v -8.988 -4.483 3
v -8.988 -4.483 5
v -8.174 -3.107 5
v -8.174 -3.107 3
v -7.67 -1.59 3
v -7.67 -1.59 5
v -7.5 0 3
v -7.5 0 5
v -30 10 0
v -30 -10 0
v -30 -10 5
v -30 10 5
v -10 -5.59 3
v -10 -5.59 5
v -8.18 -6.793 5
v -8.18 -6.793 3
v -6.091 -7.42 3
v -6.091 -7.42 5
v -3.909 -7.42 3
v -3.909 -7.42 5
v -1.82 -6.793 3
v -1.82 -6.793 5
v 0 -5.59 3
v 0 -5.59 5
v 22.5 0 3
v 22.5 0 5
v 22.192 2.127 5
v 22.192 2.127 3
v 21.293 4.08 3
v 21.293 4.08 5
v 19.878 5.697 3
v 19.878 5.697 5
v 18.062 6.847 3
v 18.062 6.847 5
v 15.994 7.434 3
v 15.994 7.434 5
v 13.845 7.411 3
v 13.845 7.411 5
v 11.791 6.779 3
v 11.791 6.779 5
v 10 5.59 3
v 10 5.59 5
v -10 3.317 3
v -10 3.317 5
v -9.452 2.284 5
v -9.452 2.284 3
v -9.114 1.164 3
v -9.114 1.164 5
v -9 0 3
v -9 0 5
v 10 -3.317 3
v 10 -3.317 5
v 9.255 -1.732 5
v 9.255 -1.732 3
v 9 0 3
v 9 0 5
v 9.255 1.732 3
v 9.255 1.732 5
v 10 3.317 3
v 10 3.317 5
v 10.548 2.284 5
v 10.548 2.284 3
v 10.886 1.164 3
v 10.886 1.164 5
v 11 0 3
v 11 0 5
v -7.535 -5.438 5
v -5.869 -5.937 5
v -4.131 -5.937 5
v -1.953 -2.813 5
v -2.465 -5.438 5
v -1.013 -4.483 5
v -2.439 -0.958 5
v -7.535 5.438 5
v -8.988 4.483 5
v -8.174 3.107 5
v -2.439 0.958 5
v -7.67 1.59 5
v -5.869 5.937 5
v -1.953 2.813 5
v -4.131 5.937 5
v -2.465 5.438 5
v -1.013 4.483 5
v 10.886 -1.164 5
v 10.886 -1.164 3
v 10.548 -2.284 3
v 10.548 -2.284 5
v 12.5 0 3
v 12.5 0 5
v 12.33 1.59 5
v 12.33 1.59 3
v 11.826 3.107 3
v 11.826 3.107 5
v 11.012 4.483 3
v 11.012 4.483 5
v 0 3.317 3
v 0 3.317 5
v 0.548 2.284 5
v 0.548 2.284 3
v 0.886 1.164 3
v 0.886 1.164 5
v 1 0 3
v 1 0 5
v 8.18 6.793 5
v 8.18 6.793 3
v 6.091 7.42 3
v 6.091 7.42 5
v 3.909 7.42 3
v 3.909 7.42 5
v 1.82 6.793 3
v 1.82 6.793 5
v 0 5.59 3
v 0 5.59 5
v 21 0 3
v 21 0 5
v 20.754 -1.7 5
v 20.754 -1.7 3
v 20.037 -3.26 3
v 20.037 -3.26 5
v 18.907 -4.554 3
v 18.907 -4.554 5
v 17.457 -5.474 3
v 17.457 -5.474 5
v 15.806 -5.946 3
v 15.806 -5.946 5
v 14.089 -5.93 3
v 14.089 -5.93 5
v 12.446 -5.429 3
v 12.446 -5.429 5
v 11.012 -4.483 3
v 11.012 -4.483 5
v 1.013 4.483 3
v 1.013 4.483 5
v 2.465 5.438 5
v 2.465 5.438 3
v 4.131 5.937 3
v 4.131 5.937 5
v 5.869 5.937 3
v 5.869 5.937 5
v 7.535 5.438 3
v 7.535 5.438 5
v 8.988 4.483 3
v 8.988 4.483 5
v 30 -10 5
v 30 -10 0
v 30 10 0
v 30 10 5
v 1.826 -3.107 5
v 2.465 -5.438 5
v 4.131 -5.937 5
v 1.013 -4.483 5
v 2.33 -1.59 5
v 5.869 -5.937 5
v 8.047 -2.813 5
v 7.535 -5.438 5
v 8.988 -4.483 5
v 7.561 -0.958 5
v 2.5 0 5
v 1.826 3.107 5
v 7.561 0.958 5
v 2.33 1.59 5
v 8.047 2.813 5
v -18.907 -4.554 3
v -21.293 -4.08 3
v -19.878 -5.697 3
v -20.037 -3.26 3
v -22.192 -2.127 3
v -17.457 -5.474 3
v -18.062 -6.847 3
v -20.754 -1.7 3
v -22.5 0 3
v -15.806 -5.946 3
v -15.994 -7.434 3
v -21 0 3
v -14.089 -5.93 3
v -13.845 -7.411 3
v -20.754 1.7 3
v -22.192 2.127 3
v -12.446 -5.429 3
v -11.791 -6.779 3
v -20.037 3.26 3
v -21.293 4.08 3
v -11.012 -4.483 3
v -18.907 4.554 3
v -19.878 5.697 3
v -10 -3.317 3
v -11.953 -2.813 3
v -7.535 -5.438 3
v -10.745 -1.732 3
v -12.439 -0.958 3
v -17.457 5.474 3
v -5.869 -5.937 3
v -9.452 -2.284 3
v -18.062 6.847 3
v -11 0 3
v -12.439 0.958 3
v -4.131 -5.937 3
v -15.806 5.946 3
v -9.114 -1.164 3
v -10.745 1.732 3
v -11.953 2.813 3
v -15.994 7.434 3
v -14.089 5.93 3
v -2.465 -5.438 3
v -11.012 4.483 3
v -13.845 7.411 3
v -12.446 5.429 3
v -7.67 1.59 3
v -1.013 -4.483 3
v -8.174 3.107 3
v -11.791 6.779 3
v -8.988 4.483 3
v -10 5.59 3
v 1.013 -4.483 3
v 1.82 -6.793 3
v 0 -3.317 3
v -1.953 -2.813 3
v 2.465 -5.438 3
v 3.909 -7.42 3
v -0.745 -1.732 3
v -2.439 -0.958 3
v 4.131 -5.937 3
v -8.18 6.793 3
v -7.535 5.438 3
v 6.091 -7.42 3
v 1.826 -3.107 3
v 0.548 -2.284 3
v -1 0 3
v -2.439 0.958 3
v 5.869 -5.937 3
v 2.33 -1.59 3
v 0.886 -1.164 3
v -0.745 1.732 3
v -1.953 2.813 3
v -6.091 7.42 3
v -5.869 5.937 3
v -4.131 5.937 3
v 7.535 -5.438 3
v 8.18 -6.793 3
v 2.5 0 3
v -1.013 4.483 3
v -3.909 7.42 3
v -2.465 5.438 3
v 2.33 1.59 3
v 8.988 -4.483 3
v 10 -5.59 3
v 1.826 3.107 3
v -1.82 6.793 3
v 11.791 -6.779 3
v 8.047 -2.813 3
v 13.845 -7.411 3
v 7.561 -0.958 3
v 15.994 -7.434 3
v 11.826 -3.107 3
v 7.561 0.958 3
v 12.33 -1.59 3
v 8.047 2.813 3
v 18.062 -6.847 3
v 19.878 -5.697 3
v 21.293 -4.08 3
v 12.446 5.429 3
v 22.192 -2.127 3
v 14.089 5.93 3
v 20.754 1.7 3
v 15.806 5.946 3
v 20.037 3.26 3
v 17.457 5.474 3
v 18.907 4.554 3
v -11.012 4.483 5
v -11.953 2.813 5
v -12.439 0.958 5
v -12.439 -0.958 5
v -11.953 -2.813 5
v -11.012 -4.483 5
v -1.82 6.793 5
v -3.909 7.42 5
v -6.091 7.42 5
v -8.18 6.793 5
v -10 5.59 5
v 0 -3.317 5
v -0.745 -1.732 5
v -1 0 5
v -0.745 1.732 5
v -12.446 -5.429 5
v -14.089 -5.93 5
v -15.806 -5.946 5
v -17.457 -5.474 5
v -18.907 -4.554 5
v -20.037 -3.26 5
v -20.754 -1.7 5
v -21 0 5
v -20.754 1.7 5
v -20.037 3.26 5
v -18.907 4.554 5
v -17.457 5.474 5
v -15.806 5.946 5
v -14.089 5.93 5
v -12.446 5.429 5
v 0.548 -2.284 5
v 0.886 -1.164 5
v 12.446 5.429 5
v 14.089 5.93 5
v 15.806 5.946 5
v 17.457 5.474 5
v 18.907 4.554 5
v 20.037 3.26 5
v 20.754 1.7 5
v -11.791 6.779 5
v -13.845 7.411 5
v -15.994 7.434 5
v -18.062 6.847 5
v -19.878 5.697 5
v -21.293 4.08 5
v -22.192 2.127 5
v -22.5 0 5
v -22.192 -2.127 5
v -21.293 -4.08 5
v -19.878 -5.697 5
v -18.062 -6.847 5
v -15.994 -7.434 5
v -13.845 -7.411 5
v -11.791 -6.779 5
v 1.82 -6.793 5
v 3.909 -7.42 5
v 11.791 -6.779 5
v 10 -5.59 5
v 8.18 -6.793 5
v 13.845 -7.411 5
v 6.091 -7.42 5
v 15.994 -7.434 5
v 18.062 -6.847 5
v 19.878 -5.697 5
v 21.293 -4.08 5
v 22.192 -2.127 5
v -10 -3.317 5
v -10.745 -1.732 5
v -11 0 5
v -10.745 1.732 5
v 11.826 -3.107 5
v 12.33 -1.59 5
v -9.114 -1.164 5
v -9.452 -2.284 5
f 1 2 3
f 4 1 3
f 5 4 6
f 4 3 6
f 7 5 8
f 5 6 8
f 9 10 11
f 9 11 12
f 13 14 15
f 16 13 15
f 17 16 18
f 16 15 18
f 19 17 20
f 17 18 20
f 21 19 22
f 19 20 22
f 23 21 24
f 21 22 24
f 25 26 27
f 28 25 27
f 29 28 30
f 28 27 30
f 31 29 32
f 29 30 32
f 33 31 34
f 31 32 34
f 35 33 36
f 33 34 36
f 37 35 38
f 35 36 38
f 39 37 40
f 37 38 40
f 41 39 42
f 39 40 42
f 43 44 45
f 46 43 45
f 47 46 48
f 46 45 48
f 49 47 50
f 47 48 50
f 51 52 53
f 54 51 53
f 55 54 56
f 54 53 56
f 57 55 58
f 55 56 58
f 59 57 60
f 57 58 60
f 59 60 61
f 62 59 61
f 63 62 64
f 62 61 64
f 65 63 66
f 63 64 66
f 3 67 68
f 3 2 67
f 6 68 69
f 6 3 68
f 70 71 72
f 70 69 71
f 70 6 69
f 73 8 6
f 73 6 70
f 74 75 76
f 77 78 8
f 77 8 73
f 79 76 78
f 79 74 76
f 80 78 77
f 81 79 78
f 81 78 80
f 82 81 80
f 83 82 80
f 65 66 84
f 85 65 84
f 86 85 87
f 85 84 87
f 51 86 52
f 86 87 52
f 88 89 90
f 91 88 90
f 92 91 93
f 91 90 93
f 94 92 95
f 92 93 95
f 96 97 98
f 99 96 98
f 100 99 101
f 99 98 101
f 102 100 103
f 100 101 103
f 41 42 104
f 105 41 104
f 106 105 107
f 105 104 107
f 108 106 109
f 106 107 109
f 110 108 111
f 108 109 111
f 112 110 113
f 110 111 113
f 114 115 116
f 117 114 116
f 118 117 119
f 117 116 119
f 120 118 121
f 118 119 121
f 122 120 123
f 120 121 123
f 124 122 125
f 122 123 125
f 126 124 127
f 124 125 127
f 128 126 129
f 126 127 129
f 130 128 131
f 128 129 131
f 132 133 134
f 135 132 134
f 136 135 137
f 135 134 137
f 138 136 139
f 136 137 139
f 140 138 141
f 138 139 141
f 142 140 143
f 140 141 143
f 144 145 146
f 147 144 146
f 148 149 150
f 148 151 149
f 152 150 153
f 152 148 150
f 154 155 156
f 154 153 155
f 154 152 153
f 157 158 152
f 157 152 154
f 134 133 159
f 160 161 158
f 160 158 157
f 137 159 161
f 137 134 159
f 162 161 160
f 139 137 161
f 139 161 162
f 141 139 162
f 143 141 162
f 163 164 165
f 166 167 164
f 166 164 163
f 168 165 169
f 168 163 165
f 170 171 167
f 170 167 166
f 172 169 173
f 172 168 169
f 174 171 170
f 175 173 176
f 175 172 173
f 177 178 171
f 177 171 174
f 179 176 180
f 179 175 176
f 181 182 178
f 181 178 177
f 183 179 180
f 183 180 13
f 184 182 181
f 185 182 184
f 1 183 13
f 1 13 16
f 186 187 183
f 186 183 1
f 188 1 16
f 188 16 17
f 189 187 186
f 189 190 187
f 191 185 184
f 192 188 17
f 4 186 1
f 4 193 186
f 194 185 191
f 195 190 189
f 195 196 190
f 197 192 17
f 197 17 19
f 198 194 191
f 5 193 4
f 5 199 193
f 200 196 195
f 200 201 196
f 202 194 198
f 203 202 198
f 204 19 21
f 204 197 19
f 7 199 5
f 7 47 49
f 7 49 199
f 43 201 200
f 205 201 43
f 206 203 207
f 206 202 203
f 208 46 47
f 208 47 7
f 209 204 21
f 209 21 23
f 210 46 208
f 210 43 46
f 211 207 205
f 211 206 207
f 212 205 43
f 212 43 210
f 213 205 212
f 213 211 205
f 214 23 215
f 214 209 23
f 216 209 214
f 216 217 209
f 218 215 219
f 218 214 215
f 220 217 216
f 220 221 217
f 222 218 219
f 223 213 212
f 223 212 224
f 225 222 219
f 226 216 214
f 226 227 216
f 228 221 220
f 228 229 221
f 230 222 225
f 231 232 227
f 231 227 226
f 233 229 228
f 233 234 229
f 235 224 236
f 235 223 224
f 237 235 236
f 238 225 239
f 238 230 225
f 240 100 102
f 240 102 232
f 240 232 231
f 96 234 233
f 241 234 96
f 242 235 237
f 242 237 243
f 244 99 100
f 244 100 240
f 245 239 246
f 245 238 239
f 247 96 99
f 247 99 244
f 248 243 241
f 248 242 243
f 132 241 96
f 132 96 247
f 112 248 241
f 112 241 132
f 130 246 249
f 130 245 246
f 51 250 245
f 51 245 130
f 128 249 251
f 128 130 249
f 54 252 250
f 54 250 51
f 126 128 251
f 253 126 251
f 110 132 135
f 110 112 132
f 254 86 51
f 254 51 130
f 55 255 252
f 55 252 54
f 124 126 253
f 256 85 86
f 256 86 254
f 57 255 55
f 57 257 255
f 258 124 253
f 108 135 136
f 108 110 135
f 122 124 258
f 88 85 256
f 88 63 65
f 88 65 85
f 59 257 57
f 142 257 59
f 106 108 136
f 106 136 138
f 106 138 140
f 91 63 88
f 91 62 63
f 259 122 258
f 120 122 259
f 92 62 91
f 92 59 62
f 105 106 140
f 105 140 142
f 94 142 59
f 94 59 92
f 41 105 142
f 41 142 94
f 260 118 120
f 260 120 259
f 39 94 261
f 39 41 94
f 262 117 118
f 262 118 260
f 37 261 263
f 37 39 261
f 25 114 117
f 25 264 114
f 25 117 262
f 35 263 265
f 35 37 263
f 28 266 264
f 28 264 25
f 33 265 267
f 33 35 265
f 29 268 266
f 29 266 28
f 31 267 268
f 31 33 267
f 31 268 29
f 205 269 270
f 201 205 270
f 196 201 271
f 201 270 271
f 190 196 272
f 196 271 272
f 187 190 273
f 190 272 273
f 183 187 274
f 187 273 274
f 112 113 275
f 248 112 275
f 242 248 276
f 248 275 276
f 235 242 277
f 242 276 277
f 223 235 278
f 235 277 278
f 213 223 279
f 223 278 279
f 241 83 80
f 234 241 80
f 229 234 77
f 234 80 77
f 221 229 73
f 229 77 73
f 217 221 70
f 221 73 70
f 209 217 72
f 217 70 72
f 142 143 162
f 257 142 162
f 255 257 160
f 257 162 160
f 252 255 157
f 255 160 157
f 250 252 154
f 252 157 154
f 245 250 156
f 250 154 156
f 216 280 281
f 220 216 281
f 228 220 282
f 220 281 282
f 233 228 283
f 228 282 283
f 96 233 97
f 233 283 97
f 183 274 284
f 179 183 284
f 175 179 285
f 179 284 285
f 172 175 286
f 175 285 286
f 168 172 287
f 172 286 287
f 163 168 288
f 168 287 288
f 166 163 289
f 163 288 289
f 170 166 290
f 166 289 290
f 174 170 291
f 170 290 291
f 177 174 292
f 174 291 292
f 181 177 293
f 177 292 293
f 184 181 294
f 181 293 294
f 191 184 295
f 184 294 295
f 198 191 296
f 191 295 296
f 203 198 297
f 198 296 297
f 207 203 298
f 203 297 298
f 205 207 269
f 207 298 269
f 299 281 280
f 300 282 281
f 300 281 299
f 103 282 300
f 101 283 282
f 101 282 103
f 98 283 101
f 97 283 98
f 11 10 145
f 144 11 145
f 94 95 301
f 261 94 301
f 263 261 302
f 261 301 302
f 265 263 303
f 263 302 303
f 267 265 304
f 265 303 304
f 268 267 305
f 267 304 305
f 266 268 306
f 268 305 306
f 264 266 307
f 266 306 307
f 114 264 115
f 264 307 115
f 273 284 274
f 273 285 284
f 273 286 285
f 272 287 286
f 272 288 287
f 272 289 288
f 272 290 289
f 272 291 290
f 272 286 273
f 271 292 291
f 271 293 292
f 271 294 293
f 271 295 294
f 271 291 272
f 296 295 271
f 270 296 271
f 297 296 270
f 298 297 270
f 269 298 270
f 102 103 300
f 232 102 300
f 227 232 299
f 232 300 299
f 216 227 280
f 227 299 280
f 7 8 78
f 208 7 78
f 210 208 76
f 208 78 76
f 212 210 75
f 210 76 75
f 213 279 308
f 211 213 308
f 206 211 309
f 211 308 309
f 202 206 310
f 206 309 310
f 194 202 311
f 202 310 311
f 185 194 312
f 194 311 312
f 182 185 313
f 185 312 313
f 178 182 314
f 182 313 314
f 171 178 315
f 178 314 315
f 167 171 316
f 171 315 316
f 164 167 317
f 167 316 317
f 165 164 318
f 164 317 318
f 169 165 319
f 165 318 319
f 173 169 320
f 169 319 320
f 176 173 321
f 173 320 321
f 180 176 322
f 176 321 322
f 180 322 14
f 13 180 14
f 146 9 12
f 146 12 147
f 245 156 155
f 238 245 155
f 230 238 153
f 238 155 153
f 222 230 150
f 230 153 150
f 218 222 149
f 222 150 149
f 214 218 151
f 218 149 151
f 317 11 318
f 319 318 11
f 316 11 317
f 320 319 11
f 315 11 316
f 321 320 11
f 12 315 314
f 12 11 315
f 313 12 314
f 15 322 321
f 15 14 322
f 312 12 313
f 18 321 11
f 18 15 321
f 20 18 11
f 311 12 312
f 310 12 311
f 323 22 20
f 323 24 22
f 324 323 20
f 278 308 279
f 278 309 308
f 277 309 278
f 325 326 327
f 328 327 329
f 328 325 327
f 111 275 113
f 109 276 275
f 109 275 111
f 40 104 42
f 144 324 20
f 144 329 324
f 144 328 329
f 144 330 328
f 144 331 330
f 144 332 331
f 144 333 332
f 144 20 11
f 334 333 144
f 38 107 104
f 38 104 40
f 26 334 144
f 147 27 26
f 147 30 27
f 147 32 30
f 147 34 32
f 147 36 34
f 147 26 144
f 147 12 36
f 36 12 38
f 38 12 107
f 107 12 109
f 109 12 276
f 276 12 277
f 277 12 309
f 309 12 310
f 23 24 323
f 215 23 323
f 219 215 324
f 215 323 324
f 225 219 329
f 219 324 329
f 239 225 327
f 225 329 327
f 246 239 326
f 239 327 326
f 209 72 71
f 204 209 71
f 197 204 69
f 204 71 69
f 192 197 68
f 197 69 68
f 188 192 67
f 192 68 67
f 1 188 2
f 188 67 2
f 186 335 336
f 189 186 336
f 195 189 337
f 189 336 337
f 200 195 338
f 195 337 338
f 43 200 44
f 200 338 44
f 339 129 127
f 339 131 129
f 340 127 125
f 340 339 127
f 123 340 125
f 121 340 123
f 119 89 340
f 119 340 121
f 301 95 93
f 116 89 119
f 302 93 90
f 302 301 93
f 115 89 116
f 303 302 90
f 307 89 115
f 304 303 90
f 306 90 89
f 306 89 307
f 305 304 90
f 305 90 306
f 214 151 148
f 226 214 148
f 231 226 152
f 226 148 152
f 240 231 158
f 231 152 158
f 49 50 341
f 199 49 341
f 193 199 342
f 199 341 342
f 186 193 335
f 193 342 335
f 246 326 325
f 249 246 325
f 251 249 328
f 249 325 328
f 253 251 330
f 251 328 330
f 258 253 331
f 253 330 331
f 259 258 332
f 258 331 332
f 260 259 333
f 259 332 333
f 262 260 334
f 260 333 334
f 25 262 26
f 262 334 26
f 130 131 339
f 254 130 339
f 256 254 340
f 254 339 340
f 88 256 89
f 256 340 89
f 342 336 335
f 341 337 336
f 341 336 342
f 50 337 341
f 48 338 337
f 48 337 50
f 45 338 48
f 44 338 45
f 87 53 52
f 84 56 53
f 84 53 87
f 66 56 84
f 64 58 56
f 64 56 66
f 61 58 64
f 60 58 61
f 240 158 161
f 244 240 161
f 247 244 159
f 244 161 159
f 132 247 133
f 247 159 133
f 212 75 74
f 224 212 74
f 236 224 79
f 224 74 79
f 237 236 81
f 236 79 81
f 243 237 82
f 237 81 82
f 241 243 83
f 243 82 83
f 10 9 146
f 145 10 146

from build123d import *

# Parameters (mm, degrees)
F0_W     = 60
F0_H     = 20
F1_DEPTH = 5
F3_DEPTH = 2


with BuildPart() as f1:
    # F0 (on Top) → F1 (new body)
    with BuildSketch(Plane.XY):
        Rectangle(F0_W, F0_H)
    extrude(amount=F1_DEPTH)

    # F2 (on face) → F3 (cut)
    with BuildSketch(Plane.XY.offset(5)):
        with BuildLine():
            ThreePointArc((-8.9875, -4.4832849285), (-7.8815819875, -2.3618054535), (-7.5, 0))
            ThreePointArc((-7.5, 0), (-7.8815819875, 2.3618054535), (-8.9875, 4.4832849285))
            ThreePointArc((-8.9875, 4.4832849285), (-9.5314526404, 3.9326755483), (-10, 3.3166247904))
            ThreePointArc((-10, 3.3166247904), (-9.2554373535, 1.7320508076), (-9, 0))
            ThreePointArc((-9, 0), (-9.2554373535, -1.7320508076), (-10, -3.3166247904))
            ThreePointArc((-10, -3.3166247904), (-9.5314526404, -3.9326755483), (-8.9875, -4.4832849285))
        make_face()
        with BuildLine():
            ThreePointArc((-10, 3.3166247904), (-9.5314526404, 3.9326755483), (-8.9875, 4.4832849285))
            ThreePointArc((-8.9875, 4.4832849285), (-9.4660061735, 5.0621055232), (-10, 5.5901699437))
            ThreePointArc((-10, 5.5901699437), (-10.5339938265, 5.0621055232), (-11.0125, 4.4832849285))
            ThreePointArc((-11.0125, 4.4832849285), (-10.4685473596, 3.9326755483), (-10, 3.3166247904))
        make_face()
        with BuildLine():
            ThreePointArc((-10, 5.5901699437), (-9.4660061735, 5.0621055232), (-8.9875, 4.4832849285))
            ThreePointArc((-8.9875, 4.4832849285), (-5, 6), (-1.0125, 4.4832849285))
            ThreePointArc((-1.0125, 4.4832849285), (-0.5339938265, 5.0621055232), (0, 5.5901699437))
            ThreePointArc((0, 5.5901699437), (-5, 7.5), (-10, 5.5901699437))
        make_face()
        with BuildLine():
            ThreePointArc((-1.0125, -4.4832849285), (-5, -6), (-8.9875, -4.4832849285))
            ThreePointArc((-8.9875, -4.4832849285), (-9.4660061735, -5.0621055232), (-10, -5.5901699437))
            ThreePointArc((-10, -5.5901699437), (-5, -7.5), (0, -5.5901699437))
            ThreePointArc((0, -5.5901699437), (-0.5339938265, -5.0621055232), (-1.0125, -4.4832849285))
        make_face()
        with BuildLine():
            ThreePointArc((-10, -5.5901699437), (-9.4660061735, -5.0621055232), (-8.9875, -4.4832849285))
            ThreePointArc((-8.9875, -4.4832849285), (-9.5314526404, -3.9326755483), (-10, -3.3166247904))
            ThreePointArc((-10, -3.3166247904), (-10.4685473596, -3.9326755483), (-11.0125, -4.4832849285))
            ThreePointArc((-11.0125, -4.4832849285), (-10.5339938265, -5.0621055232), (-10, -5.5901699437))
        make_face()
        with BuildLine():
            ThreePointArc((-11.0125, 4.4832849285), (-10.5339938265, 5.0621055232), (-10, 5.5901699437))
            ThreePointArc((-10, 5.5901699437), (-22.5, 0), (-10, -5.5901699437))
            ThreePointArc((-10, -5.5901699437), (-10.5339938265, -5.0621055232), (-11.0125, -4.4832849285))
            ThreePointArc((-11.0125, -4.4832849285), (-21, 0), (-11.0125, 4.4832849285))
        make_face()
        with BuildLine():
            ThreePointArc((0, 5.5901699437), (-0.5339938265, 5.0621055232), (-1.0125, 4.4832849285))
            ThreePointArc((-1.0125, 4.4832849285), (-0.4685473596, 3.9326755483), (0, 3.3166247904))
            ThreePointArc((0, 3.3166247904), (0.4685473596, 3.9326755483), (1.0125, 4.4832849285))
            ThreePointArc((1.0125, 4.4832849285), (0.5339938265, 5.0621055232), (0, 5.5901699437))
        make_face()
        with BuildLine():
            ThreePointArc((0, 3.3166247904), (-0.4685473596, 3.9326755483), (-1.0125, 4.4832849285))
            ThreePointArc((-1.0125, 4.4832849285), (-2.5, 0), (-1.0125, -4.4832849285))
            ThreePointArc((-1.0125, -4.4832849285), (-0.4685473596, -3.9326755483), (0, -3.3166247904))
            ThreePointArc((0, -3.3166247904), (-1, 0), (0, 3.3166247904))
        make_face()
        with BuildLine():
            ThreePointArc((-10, -3.3166247904), (-11, 0), (-10, 3.3166247904))
            ThreePointArc((-10, 3.3166247904), (-10.4685473596, 3.9326755483), (-11.0125, 4.4832849285))
            ThreePointArc((-11.0125, 4.4832849285), (-12.5, 0), (-11.0125, -4.4832849285))
            ThreePointArc((-11.0125, -4.4832849285), (-10.4685473596, -3.9326755483), (-10, -3.3166247904))
        make_face()
        with BuildLine():
            ThreePointArc((0, -3.3166247904), (-0.4685473596, -3.9326755483), (-1.0125, -4.4832849285))
            ThreePointArc((-1.0125, -4.4832849285), (-0.5339938265, -5.0621055232), (0, -5.5901699437))
            ThreePointArc((0, -5.5901699437), (0.5339938265, -5.0621055232), (1.0125, -4.4832849285))
            ThreePointArc((1.0125, -4.4832849285), (0.4685473596, -3.9326755483), (0, -3.3166247904))
        make_face()
        with BuildLine():
            ThreePointArc((10, 5.5901699437), (5, 7.5), (0, 5.5901699437))
            ThreePointArc((0, 5.5901699437), (0.5339938265, 5.0621055232), (1.0125, 4.4832849285))
            ThreePointArc((1.0125, 4.4832849285), (5, 6), (8.9875, 4.4832849285))
            ThreePointArc((8.9875, 4.4832849285), (9.4660061735, 5.0621055232), (10, 5.5901699437))
        make_face()
        with BuildLine():
            ThreePointArc((1.0125, 4.4832849285), (0.4685473596, 3.9326755483), (0, 3.3166247904))
            ThreePointArc((0, 3.3166247904), (0.7445626465, 1.7320508076), (1, 0))
            ThreePointArc((1, 0), (0.7445626465, -1.7320508076), (0, -3.3166247904))
            ThreePointArc((0, -3.3166247904), (0.4685473596, -3.9326755483), (1.0125, -4.4832849285))
            ThreePointArc((1.0125, -4.4832849285), (2.1184180125, -2.3618054535), (2.5, 0))
            ThreePointArc((2.5, 0), (2.1184180125, 2.3618054535), (1.0125, 4.4832849285))
        make_face()
        with BuildLine():
            ThreePointArc((1.0125, -4.4832849285), (0.5339938265, -5.0621055232), (0, -5.5901699437))
            ThreePointArc((0, -5.5901699437), (5, -7.5), (10, -5.5901699437))
            ThreePointArc((10, -5.5901699437), (9.4660061735, -5.0621055232), (8.9875, -4.4832849285))
            ThreePointArc((8.9875, -4.4832849285), (5, -6), (1.0125, -4.4832849285))
        make_face()
        with BuildLine():
            ThreePointArc((22.5, 0), (18.0618621785, 6.8465319688), (10, 5.5901699437))
            ThreePointArc((10, 5.5901699437), (10.5339938265, 5.0621055232), (11.0125, 4.4832849285))
            ThreePointArc((11.0125, 4.4832849285), (17.4571324751, 5.4738012386), (21, 0))
            ThreePointArc((21, 0), (17.4571324751, -5.4738012386), (11.0125, -4.4832849285))
            ThreePointArc((11.0125, -4.4832849285), (10.5339938265, -5.0621055232), (10, -5.5901699437))
            ThreePointArc((10, -5.5901699437), (18.0618621785, -6.8465319688), (22.5, 0))
        make_face()
        with BuildLine():
            ThreePointArc((11.0125, 4.4832849285), (10.5339938265, 5.0621055232), (10, 5.5901699437))
            ThreePointArc((10, 5.5901699437), (9.4660061735, 5.0621055232), (8.9875, 4.4832849285))
            ThreePointArc((8.9875, 4.4832849285), (9.5314526404, 3.9326755483), (10, 3.3166247904))
            ThreePointArc((10, 3.3166247904), (10.4685473596, 3.9326755483), (11.0125, 4.4832849285))
        make_face()
        with BuildLine():
            ThreePointArc((8.9875, -4.4832849285), (9.4660061735, -5.0621055232), (10, -5.5901699437))
            ThreePointArc((10, -5.5901699437), (10.5339938265, -5.0621055232), (11.0125, -4.4832849285))
            ThreePointArc((11.0125, -4.4832849285), (10.4685473596, -3.9326755483), (10, -3.3166247904))
            ThreePointArc((10, -3.3166247904), (9.5314526404, -3.9326755483), (8.9875, -4.4832849285))
        make_face()
        with BuildLine():
            ThreePointArc((10, 3.3166247904), (9.5314526404, 3.9326755483), (8.9875, 4.4832849285))
            ThreePointArc((8.9875, 4.4832849285), (7.5, 0), (8.9875, -4.4832849285))
            ThreePointArc((8.9875, -4.4832849285), (9.5314526404, -3.9326755483), (10, -3.3166247904))
            ThreePointArc((10, -3.3166247904), (9, 0), (10, 3.3166247904))
        make_face()
        with BuildLine():
            ThreePointArc((12.5, 0), (12.1184180125, 2.3618054535), (11.0125, 4.4832849285))
            ThreePointArc((11.0125, 4.4832849285), (10.4685473596, 3.9326755483), (10, 3.3166247904))
            ThreePointArc((10, 3.3166247904), (10.7445626465, 1.7320508076), (11, 0))
            ThreePointArc((11, 0), (10.7445626465, -1.7320508076), (10, -3.3166247904))
            ThreePointArc((10, -3.3166247904), (10.4685473596, -3.9326755483), (11.0125, -4.4832849285))
            ThreePointArc((11.0125, -4.4832849285), (12.1184180125, -2.3618054535), (12.5, 0))
        make_face()
    extrude(amount=-F3_DEPTH, mode=Mode.SUBTRACT)


solid = f1.part
